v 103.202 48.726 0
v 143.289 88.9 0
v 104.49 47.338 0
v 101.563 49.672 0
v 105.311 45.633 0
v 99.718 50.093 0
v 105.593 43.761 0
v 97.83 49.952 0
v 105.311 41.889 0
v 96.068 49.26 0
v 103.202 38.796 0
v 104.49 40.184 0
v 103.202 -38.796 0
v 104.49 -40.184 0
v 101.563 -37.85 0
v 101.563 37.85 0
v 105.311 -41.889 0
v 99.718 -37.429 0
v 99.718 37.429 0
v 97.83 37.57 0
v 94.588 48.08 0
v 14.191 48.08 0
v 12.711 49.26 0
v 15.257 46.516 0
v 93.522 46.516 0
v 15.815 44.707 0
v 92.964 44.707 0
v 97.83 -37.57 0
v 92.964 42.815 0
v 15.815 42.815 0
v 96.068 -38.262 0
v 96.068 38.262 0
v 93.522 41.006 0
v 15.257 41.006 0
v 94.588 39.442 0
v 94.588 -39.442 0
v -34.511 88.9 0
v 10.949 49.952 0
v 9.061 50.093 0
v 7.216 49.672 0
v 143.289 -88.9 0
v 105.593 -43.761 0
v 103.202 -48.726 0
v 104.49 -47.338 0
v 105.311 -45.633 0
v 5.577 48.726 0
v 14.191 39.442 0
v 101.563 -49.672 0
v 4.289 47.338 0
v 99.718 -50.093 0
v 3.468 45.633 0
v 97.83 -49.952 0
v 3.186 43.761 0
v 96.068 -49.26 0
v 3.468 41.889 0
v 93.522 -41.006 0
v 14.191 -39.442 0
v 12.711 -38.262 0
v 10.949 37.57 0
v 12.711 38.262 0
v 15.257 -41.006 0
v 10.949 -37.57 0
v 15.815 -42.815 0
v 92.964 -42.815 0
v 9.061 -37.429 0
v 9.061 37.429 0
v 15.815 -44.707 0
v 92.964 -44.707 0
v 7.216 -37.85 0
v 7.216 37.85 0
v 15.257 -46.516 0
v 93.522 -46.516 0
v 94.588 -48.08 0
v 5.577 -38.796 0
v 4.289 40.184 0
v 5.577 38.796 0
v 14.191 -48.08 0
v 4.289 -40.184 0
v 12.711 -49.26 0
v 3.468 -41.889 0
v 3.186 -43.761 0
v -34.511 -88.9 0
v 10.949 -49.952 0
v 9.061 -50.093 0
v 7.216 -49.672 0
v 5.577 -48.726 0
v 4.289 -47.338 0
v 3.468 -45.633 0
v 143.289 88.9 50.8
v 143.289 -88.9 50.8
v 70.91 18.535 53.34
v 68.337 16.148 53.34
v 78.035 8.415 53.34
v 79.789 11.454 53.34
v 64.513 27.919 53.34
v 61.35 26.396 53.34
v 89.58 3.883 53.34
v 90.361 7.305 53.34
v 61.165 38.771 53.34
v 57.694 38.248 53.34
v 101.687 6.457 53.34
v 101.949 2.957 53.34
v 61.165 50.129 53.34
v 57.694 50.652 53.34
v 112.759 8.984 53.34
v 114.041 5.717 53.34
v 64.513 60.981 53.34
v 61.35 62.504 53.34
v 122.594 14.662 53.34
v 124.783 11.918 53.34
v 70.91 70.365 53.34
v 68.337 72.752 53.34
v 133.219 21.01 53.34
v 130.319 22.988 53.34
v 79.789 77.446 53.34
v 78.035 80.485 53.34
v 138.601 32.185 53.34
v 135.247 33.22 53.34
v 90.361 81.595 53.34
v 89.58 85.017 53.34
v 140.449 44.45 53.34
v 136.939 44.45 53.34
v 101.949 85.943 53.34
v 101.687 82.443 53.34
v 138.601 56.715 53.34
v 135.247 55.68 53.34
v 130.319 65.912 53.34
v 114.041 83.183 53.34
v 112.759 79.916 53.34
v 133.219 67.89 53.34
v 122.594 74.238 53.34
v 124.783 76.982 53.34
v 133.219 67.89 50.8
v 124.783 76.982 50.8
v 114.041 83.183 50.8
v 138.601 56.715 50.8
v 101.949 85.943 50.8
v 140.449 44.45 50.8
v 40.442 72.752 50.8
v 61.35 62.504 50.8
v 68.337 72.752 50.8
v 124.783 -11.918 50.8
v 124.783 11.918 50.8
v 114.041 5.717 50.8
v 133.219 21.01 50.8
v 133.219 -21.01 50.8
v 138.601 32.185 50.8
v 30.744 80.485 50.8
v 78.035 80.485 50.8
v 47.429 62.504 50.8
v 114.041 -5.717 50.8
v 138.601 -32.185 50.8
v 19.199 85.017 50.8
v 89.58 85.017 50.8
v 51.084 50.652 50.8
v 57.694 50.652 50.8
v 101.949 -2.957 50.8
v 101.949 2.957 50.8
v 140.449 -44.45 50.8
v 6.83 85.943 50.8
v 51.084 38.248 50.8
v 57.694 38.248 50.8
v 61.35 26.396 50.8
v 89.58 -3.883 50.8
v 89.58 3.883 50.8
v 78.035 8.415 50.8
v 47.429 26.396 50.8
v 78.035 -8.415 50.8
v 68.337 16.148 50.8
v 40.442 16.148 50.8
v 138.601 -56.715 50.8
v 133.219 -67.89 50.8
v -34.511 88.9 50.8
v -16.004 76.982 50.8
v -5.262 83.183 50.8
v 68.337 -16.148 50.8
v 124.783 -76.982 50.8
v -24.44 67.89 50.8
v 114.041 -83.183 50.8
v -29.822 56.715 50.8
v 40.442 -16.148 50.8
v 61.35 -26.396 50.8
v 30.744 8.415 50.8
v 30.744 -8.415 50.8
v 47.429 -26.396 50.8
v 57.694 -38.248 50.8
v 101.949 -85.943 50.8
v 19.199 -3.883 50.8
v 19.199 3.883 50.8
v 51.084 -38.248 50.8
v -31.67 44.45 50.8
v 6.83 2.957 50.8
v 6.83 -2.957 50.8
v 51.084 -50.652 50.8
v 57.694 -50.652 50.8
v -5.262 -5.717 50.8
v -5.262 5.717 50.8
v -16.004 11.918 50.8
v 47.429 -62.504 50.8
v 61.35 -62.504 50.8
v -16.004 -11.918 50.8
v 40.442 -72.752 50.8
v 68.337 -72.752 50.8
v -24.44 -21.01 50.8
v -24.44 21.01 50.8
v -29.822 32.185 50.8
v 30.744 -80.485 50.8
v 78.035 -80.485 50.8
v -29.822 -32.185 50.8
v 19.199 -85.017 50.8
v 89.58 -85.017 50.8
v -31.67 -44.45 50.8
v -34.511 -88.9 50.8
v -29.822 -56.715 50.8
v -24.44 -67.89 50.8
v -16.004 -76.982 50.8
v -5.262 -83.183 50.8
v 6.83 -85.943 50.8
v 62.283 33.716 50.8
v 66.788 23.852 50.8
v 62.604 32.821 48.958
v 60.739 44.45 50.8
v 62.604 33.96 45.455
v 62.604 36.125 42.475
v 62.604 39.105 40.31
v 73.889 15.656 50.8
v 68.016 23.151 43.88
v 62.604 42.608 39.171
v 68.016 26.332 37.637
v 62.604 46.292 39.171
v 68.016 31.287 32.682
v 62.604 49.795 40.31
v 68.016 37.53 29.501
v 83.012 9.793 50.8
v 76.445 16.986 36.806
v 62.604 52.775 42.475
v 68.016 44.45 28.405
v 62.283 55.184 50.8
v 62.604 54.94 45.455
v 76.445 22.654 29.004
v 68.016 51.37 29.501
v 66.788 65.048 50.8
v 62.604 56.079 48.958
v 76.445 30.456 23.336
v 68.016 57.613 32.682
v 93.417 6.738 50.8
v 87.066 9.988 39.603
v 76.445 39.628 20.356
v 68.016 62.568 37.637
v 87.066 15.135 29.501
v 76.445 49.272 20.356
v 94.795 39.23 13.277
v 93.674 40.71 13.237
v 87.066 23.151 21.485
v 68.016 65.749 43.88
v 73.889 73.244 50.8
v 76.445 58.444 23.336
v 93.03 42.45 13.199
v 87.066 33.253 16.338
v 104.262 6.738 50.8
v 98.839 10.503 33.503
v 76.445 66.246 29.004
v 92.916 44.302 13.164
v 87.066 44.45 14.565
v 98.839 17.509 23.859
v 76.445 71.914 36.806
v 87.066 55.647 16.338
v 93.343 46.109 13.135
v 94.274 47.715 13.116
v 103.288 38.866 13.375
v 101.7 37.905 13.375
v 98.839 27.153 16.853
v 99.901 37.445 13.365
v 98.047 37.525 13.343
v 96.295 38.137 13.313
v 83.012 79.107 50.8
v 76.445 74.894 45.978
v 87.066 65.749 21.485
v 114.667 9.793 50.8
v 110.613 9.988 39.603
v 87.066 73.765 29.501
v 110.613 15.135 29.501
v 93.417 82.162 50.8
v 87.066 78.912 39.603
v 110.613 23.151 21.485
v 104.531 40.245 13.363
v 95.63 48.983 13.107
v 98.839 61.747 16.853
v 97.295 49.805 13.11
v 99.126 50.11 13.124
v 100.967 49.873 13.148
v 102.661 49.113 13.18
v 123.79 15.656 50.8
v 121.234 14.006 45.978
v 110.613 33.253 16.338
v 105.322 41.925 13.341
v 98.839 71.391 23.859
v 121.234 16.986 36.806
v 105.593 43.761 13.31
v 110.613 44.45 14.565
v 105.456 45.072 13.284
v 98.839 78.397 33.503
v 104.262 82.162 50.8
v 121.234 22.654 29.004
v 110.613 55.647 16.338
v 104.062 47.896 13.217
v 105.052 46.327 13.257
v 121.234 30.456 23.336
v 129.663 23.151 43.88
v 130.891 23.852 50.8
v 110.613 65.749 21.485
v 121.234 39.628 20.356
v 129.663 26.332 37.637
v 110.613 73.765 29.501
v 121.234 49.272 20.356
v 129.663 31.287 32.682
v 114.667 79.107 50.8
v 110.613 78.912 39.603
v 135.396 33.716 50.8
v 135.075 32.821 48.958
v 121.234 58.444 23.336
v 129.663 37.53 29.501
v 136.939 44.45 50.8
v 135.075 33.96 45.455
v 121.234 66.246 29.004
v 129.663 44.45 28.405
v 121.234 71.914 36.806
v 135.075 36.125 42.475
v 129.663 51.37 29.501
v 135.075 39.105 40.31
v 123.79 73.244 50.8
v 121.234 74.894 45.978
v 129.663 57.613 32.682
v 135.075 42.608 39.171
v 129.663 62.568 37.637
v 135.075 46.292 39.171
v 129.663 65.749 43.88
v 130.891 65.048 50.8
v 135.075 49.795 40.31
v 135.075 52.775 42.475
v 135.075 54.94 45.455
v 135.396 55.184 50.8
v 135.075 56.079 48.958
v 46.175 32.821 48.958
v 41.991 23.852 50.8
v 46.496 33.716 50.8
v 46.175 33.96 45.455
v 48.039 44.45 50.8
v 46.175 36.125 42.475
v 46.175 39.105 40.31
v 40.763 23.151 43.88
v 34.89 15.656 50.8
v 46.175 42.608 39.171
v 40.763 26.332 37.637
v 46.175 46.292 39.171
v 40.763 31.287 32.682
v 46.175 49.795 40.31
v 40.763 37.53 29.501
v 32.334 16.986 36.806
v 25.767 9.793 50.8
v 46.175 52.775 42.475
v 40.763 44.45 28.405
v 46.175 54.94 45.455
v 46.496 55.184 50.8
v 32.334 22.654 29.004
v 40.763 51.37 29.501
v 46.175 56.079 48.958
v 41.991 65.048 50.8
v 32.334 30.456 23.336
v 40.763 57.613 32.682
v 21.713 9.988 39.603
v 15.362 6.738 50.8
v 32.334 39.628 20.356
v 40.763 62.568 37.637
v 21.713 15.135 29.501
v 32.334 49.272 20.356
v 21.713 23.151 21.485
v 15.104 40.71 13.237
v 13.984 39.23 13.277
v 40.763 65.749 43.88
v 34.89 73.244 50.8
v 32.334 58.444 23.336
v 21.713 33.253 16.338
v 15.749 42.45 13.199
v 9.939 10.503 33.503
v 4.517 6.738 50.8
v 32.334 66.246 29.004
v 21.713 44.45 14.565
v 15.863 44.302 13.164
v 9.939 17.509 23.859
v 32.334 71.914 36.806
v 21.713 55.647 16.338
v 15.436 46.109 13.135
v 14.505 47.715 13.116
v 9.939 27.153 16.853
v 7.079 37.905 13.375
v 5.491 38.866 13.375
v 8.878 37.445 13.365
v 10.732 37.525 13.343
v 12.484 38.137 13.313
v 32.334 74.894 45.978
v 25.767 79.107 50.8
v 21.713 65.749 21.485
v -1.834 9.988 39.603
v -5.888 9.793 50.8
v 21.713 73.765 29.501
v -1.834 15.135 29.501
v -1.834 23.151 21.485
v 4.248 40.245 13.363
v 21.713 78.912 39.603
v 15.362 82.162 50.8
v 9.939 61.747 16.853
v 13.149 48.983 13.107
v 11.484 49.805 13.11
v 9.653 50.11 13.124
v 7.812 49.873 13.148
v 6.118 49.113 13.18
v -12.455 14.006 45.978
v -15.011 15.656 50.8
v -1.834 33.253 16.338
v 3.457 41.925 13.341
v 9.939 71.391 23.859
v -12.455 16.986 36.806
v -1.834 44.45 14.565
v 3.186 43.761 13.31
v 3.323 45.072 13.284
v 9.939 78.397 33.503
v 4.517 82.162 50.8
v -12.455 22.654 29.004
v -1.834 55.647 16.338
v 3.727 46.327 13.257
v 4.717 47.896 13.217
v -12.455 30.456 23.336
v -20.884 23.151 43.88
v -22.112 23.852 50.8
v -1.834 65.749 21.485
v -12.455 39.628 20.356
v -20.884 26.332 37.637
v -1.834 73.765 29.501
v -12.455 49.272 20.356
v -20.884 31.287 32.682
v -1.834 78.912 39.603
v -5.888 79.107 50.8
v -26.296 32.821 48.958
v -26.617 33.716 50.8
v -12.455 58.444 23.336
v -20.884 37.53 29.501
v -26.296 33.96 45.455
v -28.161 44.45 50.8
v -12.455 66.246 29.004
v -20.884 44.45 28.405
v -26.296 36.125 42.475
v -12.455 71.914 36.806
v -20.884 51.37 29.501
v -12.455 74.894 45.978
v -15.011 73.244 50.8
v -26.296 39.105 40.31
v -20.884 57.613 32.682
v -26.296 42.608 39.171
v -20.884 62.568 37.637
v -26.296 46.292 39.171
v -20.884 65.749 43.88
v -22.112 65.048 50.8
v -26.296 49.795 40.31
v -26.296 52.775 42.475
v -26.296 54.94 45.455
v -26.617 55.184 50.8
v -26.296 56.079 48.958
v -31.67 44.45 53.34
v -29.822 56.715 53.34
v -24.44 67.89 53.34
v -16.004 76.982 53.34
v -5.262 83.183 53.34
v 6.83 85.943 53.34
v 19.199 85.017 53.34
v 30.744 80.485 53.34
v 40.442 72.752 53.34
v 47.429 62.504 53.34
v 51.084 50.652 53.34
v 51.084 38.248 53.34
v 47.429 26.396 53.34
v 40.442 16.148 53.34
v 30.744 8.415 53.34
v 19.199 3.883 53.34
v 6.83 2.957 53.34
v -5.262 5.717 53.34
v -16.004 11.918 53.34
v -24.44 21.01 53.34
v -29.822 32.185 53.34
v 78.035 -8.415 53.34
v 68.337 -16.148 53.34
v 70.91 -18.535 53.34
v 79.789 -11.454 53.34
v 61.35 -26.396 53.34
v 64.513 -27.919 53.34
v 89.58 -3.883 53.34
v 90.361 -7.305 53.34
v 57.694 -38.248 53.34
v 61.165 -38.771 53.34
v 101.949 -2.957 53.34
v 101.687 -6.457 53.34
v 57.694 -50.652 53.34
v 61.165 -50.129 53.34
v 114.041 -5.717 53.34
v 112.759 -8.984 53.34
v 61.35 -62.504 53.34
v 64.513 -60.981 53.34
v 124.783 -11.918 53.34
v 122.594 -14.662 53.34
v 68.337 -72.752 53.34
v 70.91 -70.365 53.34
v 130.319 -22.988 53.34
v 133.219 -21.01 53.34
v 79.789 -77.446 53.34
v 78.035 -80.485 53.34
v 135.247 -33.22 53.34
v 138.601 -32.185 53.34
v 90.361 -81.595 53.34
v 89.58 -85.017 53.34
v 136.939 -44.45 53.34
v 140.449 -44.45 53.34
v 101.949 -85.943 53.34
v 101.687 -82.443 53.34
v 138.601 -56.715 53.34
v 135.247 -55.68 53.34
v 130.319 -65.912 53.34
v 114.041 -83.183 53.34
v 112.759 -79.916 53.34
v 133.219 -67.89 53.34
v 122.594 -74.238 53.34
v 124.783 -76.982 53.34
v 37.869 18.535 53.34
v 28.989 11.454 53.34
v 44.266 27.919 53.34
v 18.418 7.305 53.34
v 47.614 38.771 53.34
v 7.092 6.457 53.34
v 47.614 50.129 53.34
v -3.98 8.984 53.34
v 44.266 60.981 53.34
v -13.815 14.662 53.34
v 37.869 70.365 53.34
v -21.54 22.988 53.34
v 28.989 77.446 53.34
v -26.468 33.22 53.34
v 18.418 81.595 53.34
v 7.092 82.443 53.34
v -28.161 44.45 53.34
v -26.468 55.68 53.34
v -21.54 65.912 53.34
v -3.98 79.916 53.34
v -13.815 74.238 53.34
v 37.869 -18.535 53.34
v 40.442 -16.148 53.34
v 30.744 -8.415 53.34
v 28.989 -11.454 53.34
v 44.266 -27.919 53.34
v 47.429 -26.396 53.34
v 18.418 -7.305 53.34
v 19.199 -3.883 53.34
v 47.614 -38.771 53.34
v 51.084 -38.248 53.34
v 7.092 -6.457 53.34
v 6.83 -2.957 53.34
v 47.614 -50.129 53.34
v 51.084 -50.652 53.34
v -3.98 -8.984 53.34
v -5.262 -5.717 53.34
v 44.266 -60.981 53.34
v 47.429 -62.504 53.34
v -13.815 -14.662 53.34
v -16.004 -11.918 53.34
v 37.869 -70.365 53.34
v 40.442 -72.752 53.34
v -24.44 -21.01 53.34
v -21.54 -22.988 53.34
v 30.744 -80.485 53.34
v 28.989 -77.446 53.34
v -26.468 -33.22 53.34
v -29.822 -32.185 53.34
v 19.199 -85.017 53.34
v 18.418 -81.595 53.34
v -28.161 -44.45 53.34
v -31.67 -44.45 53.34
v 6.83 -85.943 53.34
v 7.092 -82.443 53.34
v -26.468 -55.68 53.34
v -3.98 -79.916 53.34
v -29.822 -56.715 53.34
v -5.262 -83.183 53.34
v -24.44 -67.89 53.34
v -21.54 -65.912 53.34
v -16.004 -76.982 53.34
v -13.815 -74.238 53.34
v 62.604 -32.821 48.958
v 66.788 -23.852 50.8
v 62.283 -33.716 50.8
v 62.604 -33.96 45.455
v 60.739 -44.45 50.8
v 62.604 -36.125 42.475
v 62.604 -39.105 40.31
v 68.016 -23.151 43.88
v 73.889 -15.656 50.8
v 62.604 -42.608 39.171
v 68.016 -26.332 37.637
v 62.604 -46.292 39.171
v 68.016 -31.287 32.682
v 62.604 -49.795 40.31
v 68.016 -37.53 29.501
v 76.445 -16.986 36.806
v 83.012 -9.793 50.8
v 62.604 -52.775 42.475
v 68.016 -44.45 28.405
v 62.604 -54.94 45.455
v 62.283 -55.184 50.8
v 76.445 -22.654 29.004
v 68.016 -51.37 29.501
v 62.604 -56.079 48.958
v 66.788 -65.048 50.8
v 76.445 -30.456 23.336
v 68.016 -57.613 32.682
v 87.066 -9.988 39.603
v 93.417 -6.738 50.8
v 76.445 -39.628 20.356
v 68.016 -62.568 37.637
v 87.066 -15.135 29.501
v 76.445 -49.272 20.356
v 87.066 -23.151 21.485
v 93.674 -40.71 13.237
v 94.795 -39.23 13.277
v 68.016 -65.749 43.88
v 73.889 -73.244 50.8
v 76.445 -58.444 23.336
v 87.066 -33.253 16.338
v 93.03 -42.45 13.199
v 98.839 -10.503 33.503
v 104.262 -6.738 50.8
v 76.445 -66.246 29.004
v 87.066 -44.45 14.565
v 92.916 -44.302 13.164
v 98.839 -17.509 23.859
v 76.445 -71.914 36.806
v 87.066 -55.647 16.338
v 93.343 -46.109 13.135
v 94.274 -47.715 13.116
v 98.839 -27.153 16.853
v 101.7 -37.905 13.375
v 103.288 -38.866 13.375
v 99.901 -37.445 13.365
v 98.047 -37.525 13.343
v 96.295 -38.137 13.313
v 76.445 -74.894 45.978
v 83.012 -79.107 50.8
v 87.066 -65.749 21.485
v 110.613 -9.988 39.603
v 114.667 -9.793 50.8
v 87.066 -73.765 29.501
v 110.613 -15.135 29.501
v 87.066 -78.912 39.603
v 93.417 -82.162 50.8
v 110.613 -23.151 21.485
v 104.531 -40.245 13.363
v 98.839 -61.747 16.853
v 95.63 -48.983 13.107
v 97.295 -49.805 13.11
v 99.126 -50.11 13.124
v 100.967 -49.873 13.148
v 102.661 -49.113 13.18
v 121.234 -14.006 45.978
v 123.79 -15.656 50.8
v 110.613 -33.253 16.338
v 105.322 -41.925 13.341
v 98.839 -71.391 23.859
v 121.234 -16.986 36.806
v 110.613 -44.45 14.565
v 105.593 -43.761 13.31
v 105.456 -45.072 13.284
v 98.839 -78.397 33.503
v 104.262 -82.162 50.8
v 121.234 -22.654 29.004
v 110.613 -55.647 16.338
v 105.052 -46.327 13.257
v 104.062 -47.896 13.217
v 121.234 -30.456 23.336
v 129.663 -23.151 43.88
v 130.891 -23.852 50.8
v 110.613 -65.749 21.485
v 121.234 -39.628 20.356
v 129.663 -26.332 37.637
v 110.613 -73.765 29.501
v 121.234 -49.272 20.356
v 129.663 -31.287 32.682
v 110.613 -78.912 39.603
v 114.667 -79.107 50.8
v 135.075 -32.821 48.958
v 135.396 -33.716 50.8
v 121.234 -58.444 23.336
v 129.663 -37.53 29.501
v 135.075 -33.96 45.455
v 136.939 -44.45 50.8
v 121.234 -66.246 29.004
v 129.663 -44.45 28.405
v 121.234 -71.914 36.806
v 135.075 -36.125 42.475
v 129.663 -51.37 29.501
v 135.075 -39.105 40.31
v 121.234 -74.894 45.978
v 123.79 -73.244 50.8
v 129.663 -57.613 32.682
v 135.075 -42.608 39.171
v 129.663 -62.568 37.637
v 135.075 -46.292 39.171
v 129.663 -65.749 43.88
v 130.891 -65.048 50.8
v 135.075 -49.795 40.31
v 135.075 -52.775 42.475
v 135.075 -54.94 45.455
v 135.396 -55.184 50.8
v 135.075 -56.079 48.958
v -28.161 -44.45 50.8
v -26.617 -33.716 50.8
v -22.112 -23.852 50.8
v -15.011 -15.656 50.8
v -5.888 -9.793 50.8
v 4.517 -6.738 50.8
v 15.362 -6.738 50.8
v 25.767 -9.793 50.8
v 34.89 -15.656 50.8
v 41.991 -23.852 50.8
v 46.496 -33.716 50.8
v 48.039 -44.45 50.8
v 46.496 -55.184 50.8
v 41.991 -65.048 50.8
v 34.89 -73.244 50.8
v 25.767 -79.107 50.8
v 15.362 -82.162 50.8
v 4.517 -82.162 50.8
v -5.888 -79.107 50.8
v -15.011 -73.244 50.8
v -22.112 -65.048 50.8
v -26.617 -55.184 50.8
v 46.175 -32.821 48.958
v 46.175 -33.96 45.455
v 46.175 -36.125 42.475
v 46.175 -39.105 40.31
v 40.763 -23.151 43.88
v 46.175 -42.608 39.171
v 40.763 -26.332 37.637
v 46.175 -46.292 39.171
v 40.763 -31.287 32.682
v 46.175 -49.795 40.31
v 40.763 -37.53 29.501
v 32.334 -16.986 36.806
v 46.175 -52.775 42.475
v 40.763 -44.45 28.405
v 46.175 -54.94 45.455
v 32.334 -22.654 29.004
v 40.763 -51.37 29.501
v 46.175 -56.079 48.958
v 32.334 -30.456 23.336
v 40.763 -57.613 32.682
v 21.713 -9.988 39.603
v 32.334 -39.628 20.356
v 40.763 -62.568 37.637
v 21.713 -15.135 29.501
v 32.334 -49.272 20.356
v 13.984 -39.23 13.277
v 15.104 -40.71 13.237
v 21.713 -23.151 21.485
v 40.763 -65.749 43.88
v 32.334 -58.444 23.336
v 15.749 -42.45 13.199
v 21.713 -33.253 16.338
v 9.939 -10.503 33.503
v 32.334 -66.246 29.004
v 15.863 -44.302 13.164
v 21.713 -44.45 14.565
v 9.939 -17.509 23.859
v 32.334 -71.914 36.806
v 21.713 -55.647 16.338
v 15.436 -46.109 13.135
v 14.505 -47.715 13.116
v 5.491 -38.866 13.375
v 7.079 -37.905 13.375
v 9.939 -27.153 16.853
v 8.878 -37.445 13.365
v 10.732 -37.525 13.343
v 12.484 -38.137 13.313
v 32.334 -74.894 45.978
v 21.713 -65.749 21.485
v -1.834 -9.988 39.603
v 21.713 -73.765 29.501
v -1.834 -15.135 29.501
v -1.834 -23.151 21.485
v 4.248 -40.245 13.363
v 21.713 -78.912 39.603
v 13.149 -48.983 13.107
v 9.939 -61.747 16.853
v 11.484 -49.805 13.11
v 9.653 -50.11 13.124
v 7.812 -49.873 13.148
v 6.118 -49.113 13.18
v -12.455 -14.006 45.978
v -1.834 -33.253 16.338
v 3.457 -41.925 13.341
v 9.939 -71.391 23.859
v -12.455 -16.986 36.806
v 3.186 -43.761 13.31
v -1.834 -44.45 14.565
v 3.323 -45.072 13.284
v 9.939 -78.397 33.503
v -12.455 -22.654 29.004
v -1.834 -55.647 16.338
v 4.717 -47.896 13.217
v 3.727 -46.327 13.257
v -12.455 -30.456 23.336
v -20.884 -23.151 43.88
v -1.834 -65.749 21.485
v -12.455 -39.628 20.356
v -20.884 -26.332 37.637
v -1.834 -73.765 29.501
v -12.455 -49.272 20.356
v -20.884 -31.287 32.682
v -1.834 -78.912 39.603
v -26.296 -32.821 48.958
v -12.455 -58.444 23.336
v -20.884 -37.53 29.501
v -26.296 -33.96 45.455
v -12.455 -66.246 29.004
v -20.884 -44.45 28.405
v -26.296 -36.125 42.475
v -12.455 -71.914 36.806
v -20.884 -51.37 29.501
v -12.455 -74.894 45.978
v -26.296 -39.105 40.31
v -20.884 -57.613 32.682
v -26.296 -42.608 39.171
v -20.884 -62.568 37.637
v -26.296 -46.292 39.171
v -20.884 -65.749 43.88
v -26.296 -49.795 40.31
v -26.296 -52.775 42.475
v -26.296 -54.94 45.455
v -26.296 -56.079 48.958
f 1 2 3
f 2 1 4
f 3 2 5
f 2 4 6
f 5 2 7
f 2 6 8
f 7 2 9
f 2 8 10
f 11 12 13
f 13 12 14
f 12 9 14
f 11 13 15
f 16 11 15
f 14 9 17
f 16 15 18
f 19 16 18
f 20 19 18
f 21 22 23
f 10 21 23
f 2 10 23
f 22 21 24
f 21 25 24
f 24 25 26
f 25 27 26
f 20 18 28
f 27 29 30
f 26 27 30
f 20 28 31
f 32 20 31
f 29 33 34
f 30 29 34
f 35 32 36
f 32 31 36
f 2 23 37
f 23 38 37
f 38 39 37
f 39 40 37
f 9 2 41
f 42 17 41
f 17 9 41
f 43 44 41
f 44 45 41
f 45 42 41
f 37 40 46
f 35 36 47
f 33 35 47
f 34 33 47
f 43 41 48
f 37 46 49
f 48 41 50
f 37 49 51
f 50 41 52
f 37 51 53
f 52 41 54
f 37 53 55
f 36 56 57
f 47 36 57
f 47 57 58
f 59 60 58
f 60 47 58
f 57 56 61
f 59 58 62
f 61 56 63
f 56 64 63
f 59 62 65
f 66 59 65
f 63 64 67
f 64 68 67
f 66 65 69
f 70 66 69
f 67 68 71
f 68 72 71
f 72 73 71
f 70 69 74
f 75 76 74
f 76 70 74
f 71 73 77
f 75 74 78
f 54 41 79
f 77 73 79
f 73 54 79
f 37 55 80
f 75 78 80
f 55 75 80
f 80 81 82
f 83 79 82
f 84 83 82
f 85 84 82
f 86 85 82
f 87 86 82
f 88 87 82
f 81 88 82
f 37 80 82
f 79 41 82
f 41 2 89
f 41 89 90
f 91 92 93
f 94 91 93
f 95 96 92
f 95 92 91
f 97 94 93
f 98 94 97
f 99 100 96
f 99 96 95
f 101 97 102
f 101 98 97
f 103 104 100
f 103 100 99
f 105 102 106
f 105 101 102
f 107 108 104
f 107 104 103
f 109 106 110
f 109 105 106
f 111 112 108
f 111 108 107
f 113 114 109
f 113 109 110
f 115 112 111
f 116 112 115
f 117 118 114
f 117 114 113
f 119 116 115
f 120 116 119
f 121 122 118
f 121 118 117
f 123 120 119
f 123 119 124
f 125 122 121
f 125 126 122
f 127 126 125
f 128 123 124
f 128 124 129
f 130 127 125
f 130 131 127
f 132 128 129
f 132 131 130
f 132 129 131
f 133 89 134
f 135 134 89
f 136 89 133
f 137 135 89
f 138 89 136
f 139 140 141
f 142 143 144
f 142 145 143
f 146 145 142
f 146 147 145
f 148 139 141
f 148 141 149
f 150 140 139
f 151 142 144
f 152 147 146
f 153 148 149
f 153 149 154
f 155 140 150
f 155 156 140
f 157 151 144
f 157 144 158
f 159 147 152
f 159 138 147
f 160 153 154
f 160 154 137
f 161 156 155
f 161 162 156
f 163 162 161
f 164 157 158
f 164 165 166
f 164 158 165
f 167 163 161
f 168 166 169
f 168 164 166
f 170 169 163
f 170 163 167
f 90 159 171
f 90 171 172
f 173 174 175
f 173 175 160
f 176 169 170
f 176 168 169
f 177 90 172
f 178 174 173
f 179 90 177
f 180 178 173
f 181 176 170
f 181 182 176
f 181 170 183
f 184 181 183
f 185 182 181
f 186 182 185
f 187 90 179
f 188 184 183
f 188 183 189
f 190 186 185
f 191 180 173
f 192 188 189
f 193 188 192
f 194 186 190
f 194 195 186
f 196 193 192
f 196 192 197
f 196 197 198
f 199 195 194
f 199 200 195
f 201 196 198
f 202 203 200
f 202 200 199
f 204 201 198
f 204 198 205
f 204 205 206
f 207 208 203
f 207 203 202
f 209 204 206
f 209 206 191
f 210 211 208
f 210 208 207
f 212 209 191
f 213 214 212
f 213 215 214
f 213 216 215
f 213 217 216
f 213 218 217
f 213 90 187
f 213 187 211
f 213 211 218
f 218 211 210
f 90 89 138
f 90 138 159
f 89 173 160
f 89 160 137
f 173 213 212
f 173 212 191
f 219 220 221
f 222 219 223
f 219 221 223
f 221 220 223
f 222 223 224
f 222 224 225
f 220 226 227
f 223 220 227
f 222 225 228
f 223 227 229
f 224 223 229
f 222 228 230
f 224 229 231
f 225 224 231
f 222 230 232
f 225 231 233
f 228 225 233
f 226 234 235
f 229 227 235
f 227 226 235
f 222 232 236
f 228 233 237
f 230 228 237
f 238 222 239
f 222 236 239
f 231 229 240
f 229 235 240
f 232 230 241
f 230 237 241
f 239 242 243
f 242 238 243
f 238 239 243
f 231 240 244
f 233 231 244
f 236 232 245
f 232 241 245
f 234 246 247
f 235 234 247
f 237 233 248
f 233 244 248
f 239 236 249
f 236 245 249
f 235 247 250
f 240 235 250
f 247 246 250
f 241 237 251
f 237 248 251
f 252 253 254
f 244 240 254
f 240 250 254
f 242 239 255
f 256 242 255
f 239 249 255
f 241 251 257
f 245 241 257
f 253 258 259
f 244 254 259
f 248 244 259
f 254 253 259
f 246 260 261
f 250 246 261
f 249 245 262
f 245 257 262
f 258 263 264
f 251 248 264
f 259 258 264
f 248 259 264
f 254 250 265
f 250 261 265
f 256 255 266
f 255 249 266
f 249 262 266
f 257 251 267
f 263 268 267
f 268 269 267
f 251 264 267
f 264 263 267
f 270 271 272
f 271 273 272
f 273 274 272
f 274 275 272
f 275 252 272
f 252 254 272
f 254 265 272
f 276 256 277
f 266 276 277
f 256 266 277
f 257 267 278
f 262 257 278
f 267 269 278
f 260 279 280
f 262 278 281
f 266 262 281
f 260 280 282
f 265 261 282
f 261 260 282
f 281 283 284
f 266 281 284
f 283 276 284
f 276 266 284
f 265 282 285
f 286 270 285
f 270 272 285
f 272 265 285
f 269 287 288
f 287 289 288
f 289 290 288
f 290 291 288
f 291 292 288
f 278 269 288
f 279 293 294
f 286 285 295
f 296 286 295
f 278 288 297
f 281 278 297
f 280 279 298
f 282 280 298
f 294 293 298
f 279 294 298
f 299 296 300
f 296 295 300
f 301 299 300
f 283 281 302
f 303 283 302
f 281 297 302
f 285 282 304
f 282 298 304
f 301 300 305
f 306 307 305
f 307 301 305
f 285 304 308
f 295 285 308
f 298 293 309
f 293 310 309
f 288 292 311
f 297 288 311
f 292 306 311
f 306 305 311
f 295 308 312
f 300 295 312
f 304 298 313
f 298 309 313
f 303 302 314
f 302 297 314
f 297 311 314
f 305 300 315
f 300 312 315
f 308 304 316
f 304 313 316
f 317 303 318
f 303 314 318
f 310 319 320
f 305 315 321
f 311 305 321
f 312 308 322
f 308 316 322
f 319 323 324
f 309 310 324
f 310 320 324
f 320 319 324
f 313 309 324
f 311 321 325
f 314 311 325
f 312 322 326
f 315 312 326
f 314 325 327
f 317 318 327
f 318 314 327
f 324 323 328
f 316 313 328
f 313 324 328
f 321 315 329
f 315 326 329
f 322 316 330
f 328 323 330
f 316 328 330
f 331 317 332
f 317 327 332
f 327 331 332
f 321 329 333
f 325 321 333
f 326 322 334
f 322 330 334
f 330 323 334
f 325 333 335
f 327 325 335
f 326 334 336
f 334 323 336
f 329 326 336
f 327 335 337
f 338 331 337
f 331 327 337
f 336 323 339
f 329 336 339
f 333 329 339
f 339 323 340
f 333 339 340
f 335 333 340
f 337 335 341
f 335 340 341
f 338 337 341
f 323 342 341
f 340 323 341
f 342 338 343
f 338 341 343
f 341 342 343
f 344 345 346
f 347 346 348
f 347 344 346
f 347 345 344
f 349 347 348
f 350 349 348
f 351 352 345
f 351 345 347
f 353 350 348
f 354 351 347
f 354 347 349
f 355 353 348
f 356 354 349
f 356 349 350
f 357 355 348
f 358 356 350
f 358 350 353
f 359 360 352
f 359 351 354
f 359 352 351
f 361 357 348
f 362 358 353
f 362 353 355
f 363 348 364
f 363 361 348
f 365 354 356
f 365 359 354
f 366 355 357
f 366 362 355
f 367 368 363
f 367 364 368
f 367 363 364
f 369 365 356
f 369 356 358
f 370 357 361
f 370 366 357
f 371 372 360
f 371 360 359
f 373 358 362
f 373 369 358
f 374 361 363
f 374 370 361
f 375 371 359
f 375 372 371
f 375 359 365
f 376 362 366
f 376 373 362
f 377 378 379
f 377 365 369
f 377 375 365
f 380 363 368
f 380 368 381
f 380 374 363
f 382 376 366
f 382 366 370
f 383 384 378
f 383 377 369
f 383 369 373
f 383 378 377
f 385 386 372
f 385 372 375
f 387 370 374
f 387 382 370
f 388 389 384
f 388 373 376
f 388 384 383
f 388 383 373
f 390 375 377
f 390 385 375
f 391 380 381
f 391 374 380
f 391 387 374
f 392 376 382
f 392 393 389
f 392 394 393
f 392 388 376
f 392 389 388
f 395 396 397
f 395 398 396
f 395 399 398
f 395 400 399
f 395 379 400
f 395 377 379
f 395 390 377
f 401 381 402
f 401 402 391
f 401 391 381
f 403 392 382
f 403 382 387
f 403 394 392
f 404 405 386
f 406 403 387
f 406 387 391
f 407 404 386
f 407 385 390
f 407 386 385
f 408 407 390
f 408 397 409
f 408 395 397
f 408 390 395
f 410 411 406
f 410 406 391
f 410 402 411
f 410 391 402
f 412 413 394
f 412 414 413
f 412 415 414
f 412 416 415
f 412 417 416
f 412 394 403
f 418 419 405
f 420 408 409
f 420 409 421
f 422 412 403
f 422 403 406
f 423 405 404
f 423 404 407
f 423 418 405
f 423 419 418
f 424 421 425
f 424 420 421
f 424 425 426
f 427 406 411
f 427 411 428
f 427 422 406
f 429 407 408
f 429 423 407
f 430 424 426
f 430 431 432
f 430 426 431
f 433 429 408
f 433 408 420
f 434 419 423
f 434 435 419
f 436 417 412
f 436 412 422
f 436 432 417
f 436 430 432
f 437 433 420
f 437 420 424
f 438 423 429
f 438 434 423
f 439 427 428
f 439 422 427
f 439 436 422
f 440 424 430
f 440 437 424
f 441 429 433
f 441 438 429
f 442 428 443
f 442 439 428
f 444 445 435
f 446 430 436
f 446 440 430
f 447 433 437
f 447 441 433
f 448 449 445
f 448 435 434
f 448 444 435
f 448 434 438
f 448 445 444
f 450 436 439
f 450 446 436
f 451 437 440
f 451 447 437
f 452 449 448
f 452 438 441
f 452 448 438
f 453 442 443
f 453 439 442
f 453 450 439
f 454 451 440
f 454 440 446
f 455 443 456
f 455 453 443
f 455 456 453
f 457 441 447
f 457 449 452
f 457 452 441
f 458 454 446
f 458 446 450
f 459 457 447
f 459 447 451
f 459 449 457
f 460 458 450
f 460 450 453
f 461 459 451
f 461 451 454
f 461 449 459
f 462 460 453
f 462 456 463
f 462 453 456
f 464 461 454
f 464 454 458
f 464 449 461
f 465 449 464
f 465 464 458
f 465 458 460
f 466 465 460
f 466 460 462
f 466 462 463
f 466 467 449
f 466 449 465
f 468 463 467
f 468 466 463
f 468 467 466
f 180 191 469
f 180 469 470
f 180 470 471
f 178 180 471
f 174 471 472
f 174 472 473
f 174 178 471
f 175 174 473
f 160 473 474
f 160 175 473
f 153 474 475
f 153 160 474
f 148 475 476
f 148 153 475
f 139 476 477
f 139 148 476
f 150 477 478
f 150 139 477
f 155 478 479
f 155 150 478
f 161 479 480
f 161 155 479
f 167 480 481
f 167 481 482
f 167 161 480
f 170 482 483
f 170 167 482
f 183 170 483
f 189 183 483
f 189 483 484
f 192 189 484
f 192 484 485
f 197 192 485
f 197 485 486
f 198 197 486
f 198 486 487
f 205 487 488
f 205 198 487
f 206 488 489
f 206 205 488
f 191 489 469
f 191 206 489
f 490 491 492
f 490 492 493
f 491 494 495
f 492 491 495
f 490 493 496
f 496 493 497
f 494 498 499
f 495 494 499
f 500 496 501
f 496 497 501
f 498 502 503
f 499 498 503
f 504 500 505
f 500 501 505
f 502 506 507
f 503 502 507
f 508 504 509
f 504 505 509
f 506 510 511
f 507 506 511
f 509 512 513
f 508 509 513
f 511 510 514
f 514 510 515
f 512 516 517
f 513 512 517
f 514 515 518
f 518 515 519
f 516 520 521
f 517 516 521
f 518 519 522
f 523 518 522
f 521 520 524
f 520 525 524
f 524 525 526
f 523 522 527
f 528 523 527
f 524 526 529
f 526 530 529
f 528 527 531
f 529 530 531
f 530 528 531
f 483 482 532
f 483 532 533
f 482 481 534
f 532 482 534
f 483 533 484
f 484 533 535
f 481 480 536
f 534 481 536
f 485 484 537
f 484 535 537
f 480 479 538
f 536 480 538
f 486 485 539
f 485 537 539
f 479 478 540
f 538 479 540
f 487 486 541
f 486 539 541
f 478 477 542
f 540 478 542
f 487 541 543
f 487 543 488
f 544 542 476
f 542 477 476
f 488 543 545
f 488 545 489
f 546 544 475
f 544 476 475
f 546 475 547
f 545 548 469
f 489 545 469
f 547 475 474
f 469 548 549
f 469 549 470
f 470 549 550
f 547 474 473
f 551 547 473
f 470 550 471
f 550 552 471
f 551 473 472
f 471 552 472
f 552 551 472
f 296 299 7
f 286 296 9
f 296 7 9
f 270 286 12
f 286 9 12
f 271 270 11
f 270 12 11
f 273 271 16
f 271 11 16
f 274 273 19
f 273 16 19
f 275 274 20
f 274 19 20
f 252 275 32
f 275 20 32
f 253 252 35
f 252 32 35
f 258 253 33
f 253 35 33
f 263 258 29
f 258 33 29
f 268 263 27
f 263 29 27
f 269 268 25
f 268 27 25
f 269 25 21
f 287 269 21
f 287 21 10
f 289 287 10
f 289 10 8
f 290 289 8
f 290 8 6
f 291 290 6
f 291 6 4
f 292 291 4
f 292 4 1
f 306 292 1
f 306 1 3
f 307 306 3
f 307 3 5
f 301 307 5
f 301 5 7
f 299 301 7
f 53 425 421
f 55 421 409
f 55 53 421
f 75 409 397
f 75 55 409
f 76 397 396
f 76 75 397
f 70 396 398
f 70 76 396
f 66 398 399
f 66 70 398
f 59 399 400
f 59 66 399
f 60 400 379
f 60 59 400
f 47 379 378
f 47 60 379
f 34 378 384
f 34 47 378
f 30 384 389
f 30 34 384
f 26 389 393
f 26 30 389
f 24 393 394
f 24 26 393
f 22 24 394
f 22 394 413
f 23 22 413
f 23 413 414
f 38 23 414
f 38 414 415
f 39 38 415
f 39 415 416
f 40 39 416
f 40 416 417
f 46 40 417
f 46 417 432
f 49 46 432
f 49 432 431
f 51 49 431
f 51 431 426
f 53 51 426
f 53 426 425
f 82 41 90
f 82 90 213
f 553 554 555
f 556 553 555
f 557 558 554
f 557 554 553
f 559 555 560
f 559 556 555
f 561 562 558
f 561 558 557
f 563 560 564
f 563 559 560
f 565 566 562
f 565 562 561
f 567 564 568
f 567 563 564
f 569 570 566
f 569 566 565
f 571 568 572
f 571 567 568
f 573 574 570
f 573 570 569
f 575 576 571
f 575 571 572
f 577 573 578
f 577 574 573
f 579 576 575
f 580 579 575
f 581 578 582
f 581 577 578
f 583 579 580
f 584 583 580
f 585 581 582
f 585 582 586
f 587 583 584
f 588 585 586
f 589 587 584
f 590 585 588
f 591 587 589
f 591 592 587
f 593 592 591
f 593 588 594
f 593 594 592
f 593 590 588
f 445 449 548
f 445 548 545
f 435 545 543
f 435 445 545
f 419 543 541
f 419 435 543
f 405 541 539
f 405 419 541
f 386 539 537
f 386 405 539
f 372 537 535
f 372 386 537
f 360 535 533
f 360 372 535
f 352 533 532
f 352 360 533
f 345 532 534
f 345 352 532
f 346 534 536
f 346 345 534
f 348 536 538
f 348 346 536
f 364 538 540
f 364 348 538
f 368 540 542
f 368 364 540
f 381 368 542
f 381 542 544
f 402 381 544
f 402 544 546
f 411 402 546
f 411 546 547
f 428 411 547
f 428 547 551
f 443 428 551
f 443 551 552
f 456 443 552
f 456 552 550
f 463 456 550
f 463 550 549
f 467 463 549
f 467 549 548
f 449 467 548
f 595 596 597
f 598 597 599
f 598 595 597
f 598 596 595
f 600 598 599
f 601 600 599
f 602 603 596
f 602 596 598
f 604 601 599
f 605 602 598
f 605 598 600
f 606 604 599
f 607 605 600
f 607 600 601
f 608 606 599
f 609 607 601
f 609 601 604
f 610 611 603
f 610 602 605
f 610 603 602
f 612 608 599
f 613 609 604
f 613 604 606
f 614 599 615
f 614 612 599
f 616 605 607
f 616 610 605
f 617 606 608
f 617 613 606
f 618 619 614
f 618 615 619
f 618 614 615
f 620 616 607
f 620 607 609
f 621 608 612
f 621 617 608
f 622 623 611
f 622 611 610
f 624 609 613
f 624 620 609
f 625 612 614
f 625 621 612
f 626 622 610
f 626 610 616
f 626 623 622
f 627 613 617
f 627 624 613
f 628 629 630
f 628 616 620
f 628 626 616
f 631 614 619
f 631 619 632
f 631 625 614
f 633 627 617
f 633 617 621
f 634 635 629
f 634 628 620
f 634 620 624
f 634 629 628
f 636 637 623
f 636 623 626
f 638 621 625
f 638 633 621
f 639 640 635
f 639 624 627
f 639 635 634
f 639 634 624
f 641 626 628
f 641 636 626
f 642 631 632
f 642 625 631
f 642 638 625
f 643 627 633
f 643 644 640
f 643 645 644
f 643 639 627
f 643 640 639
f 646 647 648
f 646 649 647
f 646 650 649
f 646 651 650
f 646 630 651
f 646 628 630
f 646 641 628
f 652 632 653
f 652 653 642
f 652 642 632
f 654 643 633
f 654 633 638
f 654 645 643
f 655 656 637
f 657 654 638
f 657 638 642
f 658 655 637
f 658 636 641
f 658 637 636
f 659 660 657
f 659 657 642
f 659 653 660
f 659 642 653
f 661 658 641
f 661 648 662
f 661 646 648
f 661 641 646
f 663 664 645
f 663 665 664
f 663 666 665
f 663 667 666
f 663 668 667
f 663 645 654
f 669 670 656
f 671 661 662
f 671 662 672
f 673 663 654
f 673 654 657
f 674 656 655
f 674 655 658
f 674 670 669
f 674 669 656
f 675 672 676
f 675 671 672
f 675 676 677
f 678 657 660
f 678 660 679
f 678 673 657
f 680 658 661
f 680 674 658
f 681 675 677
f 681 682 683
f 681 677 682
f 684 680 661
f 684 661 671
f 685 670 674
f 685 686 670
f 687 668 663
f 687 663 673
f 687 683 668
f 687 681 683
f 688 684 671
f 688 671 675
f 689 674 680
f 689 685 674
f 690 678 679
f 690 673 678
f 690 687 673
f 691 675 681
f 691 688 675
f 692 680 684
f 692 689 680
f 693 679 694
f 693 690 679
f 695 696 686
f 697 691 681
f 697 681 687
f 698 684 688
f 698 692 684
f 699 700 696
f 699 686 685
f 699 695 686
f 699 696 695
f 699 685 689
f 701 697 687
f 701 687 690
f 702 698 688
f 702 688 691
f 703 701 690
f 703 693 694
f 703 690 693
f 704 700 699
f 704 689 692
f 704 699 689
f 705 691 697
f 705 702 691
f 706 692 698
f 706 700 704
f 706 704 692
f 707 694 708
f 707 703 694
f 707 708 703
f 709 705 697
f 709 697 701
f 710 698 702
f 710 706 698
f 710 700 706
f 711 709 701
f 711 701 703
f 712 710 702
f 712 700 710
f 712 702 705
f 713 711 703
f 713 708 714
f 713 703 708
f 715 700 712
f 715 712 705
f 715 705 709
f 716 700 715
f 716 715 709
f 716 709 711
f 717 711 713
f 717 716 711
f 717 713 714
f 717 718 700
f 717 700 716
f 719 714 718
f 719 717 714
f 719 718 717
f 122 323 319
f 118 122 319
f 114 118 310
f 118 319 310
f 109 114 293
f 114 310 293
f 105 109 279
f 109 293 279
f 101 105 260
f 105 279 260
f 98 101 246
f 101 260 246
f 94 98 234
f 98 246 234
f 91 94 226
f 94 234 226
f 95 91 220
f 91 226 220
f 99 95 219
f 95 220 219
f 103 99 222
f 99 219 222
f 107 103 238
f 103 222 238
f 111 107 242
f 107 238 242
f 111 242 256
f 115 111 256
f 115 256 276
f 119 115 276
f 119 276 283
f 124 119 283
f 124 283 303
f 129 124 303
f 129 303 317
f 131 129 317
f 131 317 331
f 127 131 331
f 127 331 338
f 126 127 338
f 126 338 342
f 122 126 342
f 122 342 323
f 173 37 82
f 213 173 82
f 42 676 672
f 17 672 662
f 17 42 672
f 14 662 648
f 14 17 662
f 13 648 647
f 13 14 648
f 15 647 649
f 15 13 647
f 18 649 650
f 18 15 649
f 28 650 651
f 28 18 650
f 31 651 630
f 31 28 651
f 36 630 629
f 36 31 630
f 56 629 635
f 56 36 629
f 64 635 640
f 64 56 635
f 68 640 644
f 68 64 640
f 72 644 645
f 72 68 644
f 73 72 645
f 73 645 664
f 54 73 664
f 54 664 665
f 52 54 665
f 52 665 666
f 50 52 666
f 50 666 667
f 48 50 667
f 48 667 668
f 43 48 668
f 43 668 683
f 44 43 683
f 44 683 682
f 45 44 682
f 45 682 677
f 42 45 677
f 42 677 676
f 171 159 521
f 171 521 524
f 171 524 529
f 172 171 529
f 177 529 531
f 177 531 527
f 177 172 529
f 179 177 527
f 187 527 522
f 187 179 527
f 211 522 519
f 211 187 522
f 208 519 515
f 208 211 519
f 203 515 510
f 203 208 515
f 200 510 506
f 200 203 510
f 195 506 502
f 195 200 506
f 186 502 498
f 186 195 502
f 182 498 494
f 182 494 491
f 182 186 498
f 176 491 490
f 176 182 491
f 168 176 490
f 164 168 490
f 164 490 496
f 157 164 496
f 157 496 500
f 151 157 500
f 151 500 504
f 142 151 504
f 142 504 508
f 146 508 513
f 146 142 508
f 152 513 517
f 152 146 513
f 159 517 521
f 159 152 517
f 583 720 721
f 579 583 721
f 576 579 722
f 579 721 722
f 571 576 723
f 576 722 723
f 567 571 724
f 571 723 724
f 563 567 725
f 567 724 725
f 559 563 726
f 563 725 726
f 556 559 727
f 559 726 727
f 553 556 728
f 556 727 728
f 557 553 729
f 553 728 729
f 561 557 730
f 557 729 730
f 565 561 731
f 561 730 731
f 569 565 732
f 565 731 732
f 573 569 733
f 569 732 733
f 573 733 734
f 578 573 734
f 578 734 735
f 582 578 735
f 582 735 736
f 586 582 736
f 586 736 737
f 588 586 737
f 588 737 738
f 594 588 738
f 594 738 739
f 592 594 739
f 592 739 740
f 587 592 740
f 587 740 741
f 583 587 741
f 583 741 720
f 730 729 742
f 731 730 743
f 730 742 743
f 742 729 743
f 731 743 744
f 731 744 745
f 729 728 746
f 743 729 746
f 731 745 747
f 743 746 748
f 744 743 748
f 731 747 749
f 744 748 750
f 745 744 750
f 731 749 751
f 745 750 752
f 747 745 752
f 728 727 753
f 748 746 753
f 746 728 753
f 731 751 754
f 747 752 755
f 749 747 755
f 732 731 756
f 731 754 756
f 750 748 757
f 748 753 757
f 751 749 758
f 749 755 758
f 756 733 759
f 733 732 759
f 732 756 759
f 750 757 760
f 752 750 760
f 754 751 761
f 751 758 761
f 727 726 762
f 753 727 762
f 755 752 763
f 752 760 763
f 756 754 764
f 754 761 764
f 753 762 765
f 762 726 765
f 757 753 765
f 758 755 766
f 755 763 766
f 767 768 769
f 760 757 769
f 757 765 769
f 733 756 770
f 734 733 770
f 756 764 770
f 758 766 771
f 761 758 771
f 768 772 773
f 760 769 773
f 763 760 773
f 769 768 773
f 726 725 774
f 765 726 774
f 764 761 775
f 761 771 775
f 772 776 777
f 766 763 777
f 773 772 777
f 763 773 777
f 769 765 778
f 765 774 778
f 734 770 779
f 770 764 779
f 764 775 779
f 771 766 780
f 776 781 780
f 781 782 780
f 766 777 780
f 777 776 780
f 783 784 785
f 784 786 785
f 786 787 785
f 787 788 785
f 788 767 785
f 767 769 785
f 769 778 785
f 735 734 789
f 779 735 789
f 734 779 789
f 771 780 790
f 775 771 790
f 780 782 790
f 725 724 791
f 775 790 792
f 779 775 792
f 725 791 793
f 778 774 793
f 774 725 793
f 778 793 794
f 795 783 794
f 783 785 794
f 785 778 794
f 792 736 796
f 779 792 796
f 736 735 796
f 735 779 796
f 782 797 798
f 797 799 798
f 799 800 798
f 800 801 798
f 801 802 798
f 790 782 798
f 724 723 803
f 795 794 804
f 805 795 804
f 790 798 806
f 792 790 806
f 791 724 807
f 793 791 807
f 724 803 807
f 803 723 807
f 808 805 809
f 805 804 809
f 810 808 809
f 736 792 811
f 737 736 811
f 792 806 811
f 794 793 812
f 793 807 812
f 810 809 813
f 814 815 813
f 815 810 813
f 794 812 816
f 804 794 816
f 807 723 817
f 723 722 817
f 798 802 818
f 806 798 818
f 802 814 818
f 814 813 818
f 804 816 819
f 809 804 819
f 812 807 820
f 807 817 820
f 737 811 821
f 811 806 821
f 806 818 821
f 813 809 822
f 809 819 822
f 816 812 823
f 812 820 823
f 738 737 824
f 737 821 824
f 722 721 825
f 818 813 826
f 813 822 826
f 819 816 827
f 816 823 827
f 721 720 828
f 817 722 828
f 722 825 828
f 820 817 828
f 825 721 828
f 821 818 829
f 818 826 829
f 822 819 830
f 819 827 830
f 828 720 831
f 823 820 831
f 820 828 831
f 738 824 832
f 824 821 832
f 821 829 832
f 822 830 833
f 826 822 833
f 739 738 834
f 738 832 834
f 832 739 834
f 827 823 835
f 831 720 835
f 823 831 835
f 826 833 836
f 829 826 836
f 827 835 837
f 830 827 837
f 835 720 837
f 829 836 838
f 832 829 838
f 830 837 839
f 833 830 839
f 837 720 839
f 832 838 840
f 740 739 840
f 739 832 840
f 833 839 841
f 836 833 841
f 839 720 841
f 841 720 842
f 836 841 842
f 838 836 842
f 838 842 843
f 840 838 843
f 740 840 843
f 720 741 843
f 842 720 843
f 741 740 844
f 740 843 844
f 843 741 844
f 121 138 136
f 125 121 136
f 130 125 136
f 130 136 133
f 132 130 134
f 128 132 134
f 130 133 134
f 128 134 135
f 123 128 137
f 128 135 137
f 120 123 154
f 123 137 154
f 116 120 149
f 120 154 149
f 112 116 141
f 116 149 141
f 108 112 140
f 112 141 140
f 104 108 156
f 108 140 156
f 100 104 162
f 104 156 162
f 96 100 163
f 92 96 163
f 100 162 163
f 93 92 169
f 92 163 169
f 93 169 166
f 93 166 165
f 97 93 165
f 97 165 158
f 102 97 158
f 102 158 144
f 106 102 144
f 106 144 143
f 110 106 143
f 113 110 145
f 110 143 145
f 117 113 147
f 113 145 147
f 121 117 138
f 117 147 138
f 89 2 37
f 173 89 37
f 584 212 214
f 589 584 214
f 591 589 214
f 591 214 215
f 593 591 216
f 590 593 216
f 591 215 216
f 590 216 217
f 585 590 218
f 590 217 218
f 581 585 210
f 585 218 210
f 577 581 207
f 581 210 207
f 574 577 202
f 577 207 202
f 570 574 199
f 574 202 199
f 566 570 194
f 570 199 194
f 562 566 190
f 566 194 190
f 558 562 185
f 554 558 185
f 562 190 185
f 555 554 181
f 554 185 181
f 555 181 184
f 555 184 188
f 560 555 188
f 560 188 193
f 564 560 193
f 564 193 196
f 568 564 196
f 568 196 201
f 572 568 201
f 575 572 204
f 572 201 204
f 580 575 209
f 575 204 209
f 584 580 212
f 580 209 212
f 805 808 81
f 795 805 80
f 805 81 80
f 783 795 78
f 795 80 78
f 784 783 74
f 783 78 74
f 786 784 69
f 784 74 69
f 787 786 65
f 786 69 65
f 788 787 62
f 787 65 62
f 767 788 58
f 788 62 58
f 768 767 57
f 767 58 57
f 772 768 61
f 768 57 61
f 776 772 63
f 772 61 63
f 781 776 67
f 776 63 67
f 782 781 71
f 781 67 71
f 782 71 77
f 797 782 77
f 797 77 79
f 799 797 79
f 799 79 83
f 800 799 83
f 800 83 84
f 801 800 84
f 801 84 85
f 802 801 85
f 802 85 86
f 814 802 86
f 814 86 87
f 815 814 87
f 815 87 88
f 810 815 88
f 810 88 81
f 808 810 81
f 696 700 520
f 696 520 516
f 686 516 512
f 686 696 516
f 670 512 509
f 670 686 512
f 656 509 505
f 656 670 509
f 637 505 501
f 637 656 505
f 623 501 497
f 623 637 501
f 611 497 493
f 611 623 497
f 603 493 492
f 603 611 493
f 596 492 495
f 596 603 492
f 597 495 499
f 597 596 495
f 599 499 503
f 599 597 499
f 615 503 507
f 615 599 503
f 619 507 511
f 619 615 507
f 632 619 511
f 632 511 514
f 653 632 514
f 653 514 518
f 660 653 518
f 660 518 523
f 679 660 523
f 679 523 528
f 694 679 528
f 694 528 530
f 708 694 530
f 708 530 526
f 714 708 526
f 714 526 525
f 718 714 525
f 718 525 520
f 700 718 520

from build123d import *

# Parameters (mm, degrees)
F0_W     = 88.9
F0_H     = 88.9
F1_DEPTH = 50.8
F3_ANGLE = 180
F4_R     = 41.6097493144
F5_DEPTH = 2.54
F6_R     = 6.35
F7_DEPTH = 25.4


with BuildPart() as f1:
    # F0 (on Top) → F1 (new body)
    with BuildSketch(Plane.XY):
        with Locations((98.8394960349, 44.45)):
            Rectangle(F0_W, F0_H)
    extrude(amount=F1_DEPTH)

    # F2 (on face) → F3 (revolve, cut)
    with BuildSketch(Plane.XY.offset(50.8)):
        with BuildLine():
            ThreePointArc((60.7394960349, 44.45), (98.8394960349, 6.35), (136.9394960349, 44.45))
            Line((136.9394960349, 44.45), (60.7394960349, 44.45))
        make_face()
    revolve(axis=Axis((98.8394960349, 44.45, 50.8), (1, 0, 0)), revolution_arc=F3_ANGLE, mode=Mode.SUBTRACT)

    # F4 (on face) → F5 (join)
    with BuildSketch(Plane.XY.offset(50.8)):
        with Locations((98.8394960349, 44.45)):
            Circle(F4_R)
        with BuildLine():
            ThreePointArc((60.7394960349, 44.45), (98.8394960349, 82.55), (136.9394960349, 44.45))
            ThreePointArc((136.9394960349, 44.45), (98.8394960349, 6.35), (60.7394960349, 44.45))
        make_face(mode=Mode.SUBTRACT)
    extrude(amount=F5_DEPTH)

    # F6 (on face) → F7 (cut)
    with BuildSketch(Plane(origin=(0, 0, 0), x_dir=(1, 0, 0), z_dir=(0, 0, -1))):
        with Locations((99.2432538861, -43.760972516)):
            Circle(F6_R)
    extrude(amount=-F7_DEPTH, mode=Mode.SUBTRACT)

    # F8: F1 across face


with BuildPart() as f1_1:
    add(f1.part)
    add(f1.part.mirror(Plane(origin=(54.3894960349, 44.45, 25.4), x_dir=(0, -1, 0), z_dir=(-1, 0, 0))))

    # F9: F1 across face


with BuildPart() as f1_2:
    add(f1_1.part)
    add(f1_1.part.mirror(Plane(origin=(54.3894960349, 0, 25.4), x_dir=(1, 0, 0), z_dir=(0, -1, 0))))


solid = f1_2.part
